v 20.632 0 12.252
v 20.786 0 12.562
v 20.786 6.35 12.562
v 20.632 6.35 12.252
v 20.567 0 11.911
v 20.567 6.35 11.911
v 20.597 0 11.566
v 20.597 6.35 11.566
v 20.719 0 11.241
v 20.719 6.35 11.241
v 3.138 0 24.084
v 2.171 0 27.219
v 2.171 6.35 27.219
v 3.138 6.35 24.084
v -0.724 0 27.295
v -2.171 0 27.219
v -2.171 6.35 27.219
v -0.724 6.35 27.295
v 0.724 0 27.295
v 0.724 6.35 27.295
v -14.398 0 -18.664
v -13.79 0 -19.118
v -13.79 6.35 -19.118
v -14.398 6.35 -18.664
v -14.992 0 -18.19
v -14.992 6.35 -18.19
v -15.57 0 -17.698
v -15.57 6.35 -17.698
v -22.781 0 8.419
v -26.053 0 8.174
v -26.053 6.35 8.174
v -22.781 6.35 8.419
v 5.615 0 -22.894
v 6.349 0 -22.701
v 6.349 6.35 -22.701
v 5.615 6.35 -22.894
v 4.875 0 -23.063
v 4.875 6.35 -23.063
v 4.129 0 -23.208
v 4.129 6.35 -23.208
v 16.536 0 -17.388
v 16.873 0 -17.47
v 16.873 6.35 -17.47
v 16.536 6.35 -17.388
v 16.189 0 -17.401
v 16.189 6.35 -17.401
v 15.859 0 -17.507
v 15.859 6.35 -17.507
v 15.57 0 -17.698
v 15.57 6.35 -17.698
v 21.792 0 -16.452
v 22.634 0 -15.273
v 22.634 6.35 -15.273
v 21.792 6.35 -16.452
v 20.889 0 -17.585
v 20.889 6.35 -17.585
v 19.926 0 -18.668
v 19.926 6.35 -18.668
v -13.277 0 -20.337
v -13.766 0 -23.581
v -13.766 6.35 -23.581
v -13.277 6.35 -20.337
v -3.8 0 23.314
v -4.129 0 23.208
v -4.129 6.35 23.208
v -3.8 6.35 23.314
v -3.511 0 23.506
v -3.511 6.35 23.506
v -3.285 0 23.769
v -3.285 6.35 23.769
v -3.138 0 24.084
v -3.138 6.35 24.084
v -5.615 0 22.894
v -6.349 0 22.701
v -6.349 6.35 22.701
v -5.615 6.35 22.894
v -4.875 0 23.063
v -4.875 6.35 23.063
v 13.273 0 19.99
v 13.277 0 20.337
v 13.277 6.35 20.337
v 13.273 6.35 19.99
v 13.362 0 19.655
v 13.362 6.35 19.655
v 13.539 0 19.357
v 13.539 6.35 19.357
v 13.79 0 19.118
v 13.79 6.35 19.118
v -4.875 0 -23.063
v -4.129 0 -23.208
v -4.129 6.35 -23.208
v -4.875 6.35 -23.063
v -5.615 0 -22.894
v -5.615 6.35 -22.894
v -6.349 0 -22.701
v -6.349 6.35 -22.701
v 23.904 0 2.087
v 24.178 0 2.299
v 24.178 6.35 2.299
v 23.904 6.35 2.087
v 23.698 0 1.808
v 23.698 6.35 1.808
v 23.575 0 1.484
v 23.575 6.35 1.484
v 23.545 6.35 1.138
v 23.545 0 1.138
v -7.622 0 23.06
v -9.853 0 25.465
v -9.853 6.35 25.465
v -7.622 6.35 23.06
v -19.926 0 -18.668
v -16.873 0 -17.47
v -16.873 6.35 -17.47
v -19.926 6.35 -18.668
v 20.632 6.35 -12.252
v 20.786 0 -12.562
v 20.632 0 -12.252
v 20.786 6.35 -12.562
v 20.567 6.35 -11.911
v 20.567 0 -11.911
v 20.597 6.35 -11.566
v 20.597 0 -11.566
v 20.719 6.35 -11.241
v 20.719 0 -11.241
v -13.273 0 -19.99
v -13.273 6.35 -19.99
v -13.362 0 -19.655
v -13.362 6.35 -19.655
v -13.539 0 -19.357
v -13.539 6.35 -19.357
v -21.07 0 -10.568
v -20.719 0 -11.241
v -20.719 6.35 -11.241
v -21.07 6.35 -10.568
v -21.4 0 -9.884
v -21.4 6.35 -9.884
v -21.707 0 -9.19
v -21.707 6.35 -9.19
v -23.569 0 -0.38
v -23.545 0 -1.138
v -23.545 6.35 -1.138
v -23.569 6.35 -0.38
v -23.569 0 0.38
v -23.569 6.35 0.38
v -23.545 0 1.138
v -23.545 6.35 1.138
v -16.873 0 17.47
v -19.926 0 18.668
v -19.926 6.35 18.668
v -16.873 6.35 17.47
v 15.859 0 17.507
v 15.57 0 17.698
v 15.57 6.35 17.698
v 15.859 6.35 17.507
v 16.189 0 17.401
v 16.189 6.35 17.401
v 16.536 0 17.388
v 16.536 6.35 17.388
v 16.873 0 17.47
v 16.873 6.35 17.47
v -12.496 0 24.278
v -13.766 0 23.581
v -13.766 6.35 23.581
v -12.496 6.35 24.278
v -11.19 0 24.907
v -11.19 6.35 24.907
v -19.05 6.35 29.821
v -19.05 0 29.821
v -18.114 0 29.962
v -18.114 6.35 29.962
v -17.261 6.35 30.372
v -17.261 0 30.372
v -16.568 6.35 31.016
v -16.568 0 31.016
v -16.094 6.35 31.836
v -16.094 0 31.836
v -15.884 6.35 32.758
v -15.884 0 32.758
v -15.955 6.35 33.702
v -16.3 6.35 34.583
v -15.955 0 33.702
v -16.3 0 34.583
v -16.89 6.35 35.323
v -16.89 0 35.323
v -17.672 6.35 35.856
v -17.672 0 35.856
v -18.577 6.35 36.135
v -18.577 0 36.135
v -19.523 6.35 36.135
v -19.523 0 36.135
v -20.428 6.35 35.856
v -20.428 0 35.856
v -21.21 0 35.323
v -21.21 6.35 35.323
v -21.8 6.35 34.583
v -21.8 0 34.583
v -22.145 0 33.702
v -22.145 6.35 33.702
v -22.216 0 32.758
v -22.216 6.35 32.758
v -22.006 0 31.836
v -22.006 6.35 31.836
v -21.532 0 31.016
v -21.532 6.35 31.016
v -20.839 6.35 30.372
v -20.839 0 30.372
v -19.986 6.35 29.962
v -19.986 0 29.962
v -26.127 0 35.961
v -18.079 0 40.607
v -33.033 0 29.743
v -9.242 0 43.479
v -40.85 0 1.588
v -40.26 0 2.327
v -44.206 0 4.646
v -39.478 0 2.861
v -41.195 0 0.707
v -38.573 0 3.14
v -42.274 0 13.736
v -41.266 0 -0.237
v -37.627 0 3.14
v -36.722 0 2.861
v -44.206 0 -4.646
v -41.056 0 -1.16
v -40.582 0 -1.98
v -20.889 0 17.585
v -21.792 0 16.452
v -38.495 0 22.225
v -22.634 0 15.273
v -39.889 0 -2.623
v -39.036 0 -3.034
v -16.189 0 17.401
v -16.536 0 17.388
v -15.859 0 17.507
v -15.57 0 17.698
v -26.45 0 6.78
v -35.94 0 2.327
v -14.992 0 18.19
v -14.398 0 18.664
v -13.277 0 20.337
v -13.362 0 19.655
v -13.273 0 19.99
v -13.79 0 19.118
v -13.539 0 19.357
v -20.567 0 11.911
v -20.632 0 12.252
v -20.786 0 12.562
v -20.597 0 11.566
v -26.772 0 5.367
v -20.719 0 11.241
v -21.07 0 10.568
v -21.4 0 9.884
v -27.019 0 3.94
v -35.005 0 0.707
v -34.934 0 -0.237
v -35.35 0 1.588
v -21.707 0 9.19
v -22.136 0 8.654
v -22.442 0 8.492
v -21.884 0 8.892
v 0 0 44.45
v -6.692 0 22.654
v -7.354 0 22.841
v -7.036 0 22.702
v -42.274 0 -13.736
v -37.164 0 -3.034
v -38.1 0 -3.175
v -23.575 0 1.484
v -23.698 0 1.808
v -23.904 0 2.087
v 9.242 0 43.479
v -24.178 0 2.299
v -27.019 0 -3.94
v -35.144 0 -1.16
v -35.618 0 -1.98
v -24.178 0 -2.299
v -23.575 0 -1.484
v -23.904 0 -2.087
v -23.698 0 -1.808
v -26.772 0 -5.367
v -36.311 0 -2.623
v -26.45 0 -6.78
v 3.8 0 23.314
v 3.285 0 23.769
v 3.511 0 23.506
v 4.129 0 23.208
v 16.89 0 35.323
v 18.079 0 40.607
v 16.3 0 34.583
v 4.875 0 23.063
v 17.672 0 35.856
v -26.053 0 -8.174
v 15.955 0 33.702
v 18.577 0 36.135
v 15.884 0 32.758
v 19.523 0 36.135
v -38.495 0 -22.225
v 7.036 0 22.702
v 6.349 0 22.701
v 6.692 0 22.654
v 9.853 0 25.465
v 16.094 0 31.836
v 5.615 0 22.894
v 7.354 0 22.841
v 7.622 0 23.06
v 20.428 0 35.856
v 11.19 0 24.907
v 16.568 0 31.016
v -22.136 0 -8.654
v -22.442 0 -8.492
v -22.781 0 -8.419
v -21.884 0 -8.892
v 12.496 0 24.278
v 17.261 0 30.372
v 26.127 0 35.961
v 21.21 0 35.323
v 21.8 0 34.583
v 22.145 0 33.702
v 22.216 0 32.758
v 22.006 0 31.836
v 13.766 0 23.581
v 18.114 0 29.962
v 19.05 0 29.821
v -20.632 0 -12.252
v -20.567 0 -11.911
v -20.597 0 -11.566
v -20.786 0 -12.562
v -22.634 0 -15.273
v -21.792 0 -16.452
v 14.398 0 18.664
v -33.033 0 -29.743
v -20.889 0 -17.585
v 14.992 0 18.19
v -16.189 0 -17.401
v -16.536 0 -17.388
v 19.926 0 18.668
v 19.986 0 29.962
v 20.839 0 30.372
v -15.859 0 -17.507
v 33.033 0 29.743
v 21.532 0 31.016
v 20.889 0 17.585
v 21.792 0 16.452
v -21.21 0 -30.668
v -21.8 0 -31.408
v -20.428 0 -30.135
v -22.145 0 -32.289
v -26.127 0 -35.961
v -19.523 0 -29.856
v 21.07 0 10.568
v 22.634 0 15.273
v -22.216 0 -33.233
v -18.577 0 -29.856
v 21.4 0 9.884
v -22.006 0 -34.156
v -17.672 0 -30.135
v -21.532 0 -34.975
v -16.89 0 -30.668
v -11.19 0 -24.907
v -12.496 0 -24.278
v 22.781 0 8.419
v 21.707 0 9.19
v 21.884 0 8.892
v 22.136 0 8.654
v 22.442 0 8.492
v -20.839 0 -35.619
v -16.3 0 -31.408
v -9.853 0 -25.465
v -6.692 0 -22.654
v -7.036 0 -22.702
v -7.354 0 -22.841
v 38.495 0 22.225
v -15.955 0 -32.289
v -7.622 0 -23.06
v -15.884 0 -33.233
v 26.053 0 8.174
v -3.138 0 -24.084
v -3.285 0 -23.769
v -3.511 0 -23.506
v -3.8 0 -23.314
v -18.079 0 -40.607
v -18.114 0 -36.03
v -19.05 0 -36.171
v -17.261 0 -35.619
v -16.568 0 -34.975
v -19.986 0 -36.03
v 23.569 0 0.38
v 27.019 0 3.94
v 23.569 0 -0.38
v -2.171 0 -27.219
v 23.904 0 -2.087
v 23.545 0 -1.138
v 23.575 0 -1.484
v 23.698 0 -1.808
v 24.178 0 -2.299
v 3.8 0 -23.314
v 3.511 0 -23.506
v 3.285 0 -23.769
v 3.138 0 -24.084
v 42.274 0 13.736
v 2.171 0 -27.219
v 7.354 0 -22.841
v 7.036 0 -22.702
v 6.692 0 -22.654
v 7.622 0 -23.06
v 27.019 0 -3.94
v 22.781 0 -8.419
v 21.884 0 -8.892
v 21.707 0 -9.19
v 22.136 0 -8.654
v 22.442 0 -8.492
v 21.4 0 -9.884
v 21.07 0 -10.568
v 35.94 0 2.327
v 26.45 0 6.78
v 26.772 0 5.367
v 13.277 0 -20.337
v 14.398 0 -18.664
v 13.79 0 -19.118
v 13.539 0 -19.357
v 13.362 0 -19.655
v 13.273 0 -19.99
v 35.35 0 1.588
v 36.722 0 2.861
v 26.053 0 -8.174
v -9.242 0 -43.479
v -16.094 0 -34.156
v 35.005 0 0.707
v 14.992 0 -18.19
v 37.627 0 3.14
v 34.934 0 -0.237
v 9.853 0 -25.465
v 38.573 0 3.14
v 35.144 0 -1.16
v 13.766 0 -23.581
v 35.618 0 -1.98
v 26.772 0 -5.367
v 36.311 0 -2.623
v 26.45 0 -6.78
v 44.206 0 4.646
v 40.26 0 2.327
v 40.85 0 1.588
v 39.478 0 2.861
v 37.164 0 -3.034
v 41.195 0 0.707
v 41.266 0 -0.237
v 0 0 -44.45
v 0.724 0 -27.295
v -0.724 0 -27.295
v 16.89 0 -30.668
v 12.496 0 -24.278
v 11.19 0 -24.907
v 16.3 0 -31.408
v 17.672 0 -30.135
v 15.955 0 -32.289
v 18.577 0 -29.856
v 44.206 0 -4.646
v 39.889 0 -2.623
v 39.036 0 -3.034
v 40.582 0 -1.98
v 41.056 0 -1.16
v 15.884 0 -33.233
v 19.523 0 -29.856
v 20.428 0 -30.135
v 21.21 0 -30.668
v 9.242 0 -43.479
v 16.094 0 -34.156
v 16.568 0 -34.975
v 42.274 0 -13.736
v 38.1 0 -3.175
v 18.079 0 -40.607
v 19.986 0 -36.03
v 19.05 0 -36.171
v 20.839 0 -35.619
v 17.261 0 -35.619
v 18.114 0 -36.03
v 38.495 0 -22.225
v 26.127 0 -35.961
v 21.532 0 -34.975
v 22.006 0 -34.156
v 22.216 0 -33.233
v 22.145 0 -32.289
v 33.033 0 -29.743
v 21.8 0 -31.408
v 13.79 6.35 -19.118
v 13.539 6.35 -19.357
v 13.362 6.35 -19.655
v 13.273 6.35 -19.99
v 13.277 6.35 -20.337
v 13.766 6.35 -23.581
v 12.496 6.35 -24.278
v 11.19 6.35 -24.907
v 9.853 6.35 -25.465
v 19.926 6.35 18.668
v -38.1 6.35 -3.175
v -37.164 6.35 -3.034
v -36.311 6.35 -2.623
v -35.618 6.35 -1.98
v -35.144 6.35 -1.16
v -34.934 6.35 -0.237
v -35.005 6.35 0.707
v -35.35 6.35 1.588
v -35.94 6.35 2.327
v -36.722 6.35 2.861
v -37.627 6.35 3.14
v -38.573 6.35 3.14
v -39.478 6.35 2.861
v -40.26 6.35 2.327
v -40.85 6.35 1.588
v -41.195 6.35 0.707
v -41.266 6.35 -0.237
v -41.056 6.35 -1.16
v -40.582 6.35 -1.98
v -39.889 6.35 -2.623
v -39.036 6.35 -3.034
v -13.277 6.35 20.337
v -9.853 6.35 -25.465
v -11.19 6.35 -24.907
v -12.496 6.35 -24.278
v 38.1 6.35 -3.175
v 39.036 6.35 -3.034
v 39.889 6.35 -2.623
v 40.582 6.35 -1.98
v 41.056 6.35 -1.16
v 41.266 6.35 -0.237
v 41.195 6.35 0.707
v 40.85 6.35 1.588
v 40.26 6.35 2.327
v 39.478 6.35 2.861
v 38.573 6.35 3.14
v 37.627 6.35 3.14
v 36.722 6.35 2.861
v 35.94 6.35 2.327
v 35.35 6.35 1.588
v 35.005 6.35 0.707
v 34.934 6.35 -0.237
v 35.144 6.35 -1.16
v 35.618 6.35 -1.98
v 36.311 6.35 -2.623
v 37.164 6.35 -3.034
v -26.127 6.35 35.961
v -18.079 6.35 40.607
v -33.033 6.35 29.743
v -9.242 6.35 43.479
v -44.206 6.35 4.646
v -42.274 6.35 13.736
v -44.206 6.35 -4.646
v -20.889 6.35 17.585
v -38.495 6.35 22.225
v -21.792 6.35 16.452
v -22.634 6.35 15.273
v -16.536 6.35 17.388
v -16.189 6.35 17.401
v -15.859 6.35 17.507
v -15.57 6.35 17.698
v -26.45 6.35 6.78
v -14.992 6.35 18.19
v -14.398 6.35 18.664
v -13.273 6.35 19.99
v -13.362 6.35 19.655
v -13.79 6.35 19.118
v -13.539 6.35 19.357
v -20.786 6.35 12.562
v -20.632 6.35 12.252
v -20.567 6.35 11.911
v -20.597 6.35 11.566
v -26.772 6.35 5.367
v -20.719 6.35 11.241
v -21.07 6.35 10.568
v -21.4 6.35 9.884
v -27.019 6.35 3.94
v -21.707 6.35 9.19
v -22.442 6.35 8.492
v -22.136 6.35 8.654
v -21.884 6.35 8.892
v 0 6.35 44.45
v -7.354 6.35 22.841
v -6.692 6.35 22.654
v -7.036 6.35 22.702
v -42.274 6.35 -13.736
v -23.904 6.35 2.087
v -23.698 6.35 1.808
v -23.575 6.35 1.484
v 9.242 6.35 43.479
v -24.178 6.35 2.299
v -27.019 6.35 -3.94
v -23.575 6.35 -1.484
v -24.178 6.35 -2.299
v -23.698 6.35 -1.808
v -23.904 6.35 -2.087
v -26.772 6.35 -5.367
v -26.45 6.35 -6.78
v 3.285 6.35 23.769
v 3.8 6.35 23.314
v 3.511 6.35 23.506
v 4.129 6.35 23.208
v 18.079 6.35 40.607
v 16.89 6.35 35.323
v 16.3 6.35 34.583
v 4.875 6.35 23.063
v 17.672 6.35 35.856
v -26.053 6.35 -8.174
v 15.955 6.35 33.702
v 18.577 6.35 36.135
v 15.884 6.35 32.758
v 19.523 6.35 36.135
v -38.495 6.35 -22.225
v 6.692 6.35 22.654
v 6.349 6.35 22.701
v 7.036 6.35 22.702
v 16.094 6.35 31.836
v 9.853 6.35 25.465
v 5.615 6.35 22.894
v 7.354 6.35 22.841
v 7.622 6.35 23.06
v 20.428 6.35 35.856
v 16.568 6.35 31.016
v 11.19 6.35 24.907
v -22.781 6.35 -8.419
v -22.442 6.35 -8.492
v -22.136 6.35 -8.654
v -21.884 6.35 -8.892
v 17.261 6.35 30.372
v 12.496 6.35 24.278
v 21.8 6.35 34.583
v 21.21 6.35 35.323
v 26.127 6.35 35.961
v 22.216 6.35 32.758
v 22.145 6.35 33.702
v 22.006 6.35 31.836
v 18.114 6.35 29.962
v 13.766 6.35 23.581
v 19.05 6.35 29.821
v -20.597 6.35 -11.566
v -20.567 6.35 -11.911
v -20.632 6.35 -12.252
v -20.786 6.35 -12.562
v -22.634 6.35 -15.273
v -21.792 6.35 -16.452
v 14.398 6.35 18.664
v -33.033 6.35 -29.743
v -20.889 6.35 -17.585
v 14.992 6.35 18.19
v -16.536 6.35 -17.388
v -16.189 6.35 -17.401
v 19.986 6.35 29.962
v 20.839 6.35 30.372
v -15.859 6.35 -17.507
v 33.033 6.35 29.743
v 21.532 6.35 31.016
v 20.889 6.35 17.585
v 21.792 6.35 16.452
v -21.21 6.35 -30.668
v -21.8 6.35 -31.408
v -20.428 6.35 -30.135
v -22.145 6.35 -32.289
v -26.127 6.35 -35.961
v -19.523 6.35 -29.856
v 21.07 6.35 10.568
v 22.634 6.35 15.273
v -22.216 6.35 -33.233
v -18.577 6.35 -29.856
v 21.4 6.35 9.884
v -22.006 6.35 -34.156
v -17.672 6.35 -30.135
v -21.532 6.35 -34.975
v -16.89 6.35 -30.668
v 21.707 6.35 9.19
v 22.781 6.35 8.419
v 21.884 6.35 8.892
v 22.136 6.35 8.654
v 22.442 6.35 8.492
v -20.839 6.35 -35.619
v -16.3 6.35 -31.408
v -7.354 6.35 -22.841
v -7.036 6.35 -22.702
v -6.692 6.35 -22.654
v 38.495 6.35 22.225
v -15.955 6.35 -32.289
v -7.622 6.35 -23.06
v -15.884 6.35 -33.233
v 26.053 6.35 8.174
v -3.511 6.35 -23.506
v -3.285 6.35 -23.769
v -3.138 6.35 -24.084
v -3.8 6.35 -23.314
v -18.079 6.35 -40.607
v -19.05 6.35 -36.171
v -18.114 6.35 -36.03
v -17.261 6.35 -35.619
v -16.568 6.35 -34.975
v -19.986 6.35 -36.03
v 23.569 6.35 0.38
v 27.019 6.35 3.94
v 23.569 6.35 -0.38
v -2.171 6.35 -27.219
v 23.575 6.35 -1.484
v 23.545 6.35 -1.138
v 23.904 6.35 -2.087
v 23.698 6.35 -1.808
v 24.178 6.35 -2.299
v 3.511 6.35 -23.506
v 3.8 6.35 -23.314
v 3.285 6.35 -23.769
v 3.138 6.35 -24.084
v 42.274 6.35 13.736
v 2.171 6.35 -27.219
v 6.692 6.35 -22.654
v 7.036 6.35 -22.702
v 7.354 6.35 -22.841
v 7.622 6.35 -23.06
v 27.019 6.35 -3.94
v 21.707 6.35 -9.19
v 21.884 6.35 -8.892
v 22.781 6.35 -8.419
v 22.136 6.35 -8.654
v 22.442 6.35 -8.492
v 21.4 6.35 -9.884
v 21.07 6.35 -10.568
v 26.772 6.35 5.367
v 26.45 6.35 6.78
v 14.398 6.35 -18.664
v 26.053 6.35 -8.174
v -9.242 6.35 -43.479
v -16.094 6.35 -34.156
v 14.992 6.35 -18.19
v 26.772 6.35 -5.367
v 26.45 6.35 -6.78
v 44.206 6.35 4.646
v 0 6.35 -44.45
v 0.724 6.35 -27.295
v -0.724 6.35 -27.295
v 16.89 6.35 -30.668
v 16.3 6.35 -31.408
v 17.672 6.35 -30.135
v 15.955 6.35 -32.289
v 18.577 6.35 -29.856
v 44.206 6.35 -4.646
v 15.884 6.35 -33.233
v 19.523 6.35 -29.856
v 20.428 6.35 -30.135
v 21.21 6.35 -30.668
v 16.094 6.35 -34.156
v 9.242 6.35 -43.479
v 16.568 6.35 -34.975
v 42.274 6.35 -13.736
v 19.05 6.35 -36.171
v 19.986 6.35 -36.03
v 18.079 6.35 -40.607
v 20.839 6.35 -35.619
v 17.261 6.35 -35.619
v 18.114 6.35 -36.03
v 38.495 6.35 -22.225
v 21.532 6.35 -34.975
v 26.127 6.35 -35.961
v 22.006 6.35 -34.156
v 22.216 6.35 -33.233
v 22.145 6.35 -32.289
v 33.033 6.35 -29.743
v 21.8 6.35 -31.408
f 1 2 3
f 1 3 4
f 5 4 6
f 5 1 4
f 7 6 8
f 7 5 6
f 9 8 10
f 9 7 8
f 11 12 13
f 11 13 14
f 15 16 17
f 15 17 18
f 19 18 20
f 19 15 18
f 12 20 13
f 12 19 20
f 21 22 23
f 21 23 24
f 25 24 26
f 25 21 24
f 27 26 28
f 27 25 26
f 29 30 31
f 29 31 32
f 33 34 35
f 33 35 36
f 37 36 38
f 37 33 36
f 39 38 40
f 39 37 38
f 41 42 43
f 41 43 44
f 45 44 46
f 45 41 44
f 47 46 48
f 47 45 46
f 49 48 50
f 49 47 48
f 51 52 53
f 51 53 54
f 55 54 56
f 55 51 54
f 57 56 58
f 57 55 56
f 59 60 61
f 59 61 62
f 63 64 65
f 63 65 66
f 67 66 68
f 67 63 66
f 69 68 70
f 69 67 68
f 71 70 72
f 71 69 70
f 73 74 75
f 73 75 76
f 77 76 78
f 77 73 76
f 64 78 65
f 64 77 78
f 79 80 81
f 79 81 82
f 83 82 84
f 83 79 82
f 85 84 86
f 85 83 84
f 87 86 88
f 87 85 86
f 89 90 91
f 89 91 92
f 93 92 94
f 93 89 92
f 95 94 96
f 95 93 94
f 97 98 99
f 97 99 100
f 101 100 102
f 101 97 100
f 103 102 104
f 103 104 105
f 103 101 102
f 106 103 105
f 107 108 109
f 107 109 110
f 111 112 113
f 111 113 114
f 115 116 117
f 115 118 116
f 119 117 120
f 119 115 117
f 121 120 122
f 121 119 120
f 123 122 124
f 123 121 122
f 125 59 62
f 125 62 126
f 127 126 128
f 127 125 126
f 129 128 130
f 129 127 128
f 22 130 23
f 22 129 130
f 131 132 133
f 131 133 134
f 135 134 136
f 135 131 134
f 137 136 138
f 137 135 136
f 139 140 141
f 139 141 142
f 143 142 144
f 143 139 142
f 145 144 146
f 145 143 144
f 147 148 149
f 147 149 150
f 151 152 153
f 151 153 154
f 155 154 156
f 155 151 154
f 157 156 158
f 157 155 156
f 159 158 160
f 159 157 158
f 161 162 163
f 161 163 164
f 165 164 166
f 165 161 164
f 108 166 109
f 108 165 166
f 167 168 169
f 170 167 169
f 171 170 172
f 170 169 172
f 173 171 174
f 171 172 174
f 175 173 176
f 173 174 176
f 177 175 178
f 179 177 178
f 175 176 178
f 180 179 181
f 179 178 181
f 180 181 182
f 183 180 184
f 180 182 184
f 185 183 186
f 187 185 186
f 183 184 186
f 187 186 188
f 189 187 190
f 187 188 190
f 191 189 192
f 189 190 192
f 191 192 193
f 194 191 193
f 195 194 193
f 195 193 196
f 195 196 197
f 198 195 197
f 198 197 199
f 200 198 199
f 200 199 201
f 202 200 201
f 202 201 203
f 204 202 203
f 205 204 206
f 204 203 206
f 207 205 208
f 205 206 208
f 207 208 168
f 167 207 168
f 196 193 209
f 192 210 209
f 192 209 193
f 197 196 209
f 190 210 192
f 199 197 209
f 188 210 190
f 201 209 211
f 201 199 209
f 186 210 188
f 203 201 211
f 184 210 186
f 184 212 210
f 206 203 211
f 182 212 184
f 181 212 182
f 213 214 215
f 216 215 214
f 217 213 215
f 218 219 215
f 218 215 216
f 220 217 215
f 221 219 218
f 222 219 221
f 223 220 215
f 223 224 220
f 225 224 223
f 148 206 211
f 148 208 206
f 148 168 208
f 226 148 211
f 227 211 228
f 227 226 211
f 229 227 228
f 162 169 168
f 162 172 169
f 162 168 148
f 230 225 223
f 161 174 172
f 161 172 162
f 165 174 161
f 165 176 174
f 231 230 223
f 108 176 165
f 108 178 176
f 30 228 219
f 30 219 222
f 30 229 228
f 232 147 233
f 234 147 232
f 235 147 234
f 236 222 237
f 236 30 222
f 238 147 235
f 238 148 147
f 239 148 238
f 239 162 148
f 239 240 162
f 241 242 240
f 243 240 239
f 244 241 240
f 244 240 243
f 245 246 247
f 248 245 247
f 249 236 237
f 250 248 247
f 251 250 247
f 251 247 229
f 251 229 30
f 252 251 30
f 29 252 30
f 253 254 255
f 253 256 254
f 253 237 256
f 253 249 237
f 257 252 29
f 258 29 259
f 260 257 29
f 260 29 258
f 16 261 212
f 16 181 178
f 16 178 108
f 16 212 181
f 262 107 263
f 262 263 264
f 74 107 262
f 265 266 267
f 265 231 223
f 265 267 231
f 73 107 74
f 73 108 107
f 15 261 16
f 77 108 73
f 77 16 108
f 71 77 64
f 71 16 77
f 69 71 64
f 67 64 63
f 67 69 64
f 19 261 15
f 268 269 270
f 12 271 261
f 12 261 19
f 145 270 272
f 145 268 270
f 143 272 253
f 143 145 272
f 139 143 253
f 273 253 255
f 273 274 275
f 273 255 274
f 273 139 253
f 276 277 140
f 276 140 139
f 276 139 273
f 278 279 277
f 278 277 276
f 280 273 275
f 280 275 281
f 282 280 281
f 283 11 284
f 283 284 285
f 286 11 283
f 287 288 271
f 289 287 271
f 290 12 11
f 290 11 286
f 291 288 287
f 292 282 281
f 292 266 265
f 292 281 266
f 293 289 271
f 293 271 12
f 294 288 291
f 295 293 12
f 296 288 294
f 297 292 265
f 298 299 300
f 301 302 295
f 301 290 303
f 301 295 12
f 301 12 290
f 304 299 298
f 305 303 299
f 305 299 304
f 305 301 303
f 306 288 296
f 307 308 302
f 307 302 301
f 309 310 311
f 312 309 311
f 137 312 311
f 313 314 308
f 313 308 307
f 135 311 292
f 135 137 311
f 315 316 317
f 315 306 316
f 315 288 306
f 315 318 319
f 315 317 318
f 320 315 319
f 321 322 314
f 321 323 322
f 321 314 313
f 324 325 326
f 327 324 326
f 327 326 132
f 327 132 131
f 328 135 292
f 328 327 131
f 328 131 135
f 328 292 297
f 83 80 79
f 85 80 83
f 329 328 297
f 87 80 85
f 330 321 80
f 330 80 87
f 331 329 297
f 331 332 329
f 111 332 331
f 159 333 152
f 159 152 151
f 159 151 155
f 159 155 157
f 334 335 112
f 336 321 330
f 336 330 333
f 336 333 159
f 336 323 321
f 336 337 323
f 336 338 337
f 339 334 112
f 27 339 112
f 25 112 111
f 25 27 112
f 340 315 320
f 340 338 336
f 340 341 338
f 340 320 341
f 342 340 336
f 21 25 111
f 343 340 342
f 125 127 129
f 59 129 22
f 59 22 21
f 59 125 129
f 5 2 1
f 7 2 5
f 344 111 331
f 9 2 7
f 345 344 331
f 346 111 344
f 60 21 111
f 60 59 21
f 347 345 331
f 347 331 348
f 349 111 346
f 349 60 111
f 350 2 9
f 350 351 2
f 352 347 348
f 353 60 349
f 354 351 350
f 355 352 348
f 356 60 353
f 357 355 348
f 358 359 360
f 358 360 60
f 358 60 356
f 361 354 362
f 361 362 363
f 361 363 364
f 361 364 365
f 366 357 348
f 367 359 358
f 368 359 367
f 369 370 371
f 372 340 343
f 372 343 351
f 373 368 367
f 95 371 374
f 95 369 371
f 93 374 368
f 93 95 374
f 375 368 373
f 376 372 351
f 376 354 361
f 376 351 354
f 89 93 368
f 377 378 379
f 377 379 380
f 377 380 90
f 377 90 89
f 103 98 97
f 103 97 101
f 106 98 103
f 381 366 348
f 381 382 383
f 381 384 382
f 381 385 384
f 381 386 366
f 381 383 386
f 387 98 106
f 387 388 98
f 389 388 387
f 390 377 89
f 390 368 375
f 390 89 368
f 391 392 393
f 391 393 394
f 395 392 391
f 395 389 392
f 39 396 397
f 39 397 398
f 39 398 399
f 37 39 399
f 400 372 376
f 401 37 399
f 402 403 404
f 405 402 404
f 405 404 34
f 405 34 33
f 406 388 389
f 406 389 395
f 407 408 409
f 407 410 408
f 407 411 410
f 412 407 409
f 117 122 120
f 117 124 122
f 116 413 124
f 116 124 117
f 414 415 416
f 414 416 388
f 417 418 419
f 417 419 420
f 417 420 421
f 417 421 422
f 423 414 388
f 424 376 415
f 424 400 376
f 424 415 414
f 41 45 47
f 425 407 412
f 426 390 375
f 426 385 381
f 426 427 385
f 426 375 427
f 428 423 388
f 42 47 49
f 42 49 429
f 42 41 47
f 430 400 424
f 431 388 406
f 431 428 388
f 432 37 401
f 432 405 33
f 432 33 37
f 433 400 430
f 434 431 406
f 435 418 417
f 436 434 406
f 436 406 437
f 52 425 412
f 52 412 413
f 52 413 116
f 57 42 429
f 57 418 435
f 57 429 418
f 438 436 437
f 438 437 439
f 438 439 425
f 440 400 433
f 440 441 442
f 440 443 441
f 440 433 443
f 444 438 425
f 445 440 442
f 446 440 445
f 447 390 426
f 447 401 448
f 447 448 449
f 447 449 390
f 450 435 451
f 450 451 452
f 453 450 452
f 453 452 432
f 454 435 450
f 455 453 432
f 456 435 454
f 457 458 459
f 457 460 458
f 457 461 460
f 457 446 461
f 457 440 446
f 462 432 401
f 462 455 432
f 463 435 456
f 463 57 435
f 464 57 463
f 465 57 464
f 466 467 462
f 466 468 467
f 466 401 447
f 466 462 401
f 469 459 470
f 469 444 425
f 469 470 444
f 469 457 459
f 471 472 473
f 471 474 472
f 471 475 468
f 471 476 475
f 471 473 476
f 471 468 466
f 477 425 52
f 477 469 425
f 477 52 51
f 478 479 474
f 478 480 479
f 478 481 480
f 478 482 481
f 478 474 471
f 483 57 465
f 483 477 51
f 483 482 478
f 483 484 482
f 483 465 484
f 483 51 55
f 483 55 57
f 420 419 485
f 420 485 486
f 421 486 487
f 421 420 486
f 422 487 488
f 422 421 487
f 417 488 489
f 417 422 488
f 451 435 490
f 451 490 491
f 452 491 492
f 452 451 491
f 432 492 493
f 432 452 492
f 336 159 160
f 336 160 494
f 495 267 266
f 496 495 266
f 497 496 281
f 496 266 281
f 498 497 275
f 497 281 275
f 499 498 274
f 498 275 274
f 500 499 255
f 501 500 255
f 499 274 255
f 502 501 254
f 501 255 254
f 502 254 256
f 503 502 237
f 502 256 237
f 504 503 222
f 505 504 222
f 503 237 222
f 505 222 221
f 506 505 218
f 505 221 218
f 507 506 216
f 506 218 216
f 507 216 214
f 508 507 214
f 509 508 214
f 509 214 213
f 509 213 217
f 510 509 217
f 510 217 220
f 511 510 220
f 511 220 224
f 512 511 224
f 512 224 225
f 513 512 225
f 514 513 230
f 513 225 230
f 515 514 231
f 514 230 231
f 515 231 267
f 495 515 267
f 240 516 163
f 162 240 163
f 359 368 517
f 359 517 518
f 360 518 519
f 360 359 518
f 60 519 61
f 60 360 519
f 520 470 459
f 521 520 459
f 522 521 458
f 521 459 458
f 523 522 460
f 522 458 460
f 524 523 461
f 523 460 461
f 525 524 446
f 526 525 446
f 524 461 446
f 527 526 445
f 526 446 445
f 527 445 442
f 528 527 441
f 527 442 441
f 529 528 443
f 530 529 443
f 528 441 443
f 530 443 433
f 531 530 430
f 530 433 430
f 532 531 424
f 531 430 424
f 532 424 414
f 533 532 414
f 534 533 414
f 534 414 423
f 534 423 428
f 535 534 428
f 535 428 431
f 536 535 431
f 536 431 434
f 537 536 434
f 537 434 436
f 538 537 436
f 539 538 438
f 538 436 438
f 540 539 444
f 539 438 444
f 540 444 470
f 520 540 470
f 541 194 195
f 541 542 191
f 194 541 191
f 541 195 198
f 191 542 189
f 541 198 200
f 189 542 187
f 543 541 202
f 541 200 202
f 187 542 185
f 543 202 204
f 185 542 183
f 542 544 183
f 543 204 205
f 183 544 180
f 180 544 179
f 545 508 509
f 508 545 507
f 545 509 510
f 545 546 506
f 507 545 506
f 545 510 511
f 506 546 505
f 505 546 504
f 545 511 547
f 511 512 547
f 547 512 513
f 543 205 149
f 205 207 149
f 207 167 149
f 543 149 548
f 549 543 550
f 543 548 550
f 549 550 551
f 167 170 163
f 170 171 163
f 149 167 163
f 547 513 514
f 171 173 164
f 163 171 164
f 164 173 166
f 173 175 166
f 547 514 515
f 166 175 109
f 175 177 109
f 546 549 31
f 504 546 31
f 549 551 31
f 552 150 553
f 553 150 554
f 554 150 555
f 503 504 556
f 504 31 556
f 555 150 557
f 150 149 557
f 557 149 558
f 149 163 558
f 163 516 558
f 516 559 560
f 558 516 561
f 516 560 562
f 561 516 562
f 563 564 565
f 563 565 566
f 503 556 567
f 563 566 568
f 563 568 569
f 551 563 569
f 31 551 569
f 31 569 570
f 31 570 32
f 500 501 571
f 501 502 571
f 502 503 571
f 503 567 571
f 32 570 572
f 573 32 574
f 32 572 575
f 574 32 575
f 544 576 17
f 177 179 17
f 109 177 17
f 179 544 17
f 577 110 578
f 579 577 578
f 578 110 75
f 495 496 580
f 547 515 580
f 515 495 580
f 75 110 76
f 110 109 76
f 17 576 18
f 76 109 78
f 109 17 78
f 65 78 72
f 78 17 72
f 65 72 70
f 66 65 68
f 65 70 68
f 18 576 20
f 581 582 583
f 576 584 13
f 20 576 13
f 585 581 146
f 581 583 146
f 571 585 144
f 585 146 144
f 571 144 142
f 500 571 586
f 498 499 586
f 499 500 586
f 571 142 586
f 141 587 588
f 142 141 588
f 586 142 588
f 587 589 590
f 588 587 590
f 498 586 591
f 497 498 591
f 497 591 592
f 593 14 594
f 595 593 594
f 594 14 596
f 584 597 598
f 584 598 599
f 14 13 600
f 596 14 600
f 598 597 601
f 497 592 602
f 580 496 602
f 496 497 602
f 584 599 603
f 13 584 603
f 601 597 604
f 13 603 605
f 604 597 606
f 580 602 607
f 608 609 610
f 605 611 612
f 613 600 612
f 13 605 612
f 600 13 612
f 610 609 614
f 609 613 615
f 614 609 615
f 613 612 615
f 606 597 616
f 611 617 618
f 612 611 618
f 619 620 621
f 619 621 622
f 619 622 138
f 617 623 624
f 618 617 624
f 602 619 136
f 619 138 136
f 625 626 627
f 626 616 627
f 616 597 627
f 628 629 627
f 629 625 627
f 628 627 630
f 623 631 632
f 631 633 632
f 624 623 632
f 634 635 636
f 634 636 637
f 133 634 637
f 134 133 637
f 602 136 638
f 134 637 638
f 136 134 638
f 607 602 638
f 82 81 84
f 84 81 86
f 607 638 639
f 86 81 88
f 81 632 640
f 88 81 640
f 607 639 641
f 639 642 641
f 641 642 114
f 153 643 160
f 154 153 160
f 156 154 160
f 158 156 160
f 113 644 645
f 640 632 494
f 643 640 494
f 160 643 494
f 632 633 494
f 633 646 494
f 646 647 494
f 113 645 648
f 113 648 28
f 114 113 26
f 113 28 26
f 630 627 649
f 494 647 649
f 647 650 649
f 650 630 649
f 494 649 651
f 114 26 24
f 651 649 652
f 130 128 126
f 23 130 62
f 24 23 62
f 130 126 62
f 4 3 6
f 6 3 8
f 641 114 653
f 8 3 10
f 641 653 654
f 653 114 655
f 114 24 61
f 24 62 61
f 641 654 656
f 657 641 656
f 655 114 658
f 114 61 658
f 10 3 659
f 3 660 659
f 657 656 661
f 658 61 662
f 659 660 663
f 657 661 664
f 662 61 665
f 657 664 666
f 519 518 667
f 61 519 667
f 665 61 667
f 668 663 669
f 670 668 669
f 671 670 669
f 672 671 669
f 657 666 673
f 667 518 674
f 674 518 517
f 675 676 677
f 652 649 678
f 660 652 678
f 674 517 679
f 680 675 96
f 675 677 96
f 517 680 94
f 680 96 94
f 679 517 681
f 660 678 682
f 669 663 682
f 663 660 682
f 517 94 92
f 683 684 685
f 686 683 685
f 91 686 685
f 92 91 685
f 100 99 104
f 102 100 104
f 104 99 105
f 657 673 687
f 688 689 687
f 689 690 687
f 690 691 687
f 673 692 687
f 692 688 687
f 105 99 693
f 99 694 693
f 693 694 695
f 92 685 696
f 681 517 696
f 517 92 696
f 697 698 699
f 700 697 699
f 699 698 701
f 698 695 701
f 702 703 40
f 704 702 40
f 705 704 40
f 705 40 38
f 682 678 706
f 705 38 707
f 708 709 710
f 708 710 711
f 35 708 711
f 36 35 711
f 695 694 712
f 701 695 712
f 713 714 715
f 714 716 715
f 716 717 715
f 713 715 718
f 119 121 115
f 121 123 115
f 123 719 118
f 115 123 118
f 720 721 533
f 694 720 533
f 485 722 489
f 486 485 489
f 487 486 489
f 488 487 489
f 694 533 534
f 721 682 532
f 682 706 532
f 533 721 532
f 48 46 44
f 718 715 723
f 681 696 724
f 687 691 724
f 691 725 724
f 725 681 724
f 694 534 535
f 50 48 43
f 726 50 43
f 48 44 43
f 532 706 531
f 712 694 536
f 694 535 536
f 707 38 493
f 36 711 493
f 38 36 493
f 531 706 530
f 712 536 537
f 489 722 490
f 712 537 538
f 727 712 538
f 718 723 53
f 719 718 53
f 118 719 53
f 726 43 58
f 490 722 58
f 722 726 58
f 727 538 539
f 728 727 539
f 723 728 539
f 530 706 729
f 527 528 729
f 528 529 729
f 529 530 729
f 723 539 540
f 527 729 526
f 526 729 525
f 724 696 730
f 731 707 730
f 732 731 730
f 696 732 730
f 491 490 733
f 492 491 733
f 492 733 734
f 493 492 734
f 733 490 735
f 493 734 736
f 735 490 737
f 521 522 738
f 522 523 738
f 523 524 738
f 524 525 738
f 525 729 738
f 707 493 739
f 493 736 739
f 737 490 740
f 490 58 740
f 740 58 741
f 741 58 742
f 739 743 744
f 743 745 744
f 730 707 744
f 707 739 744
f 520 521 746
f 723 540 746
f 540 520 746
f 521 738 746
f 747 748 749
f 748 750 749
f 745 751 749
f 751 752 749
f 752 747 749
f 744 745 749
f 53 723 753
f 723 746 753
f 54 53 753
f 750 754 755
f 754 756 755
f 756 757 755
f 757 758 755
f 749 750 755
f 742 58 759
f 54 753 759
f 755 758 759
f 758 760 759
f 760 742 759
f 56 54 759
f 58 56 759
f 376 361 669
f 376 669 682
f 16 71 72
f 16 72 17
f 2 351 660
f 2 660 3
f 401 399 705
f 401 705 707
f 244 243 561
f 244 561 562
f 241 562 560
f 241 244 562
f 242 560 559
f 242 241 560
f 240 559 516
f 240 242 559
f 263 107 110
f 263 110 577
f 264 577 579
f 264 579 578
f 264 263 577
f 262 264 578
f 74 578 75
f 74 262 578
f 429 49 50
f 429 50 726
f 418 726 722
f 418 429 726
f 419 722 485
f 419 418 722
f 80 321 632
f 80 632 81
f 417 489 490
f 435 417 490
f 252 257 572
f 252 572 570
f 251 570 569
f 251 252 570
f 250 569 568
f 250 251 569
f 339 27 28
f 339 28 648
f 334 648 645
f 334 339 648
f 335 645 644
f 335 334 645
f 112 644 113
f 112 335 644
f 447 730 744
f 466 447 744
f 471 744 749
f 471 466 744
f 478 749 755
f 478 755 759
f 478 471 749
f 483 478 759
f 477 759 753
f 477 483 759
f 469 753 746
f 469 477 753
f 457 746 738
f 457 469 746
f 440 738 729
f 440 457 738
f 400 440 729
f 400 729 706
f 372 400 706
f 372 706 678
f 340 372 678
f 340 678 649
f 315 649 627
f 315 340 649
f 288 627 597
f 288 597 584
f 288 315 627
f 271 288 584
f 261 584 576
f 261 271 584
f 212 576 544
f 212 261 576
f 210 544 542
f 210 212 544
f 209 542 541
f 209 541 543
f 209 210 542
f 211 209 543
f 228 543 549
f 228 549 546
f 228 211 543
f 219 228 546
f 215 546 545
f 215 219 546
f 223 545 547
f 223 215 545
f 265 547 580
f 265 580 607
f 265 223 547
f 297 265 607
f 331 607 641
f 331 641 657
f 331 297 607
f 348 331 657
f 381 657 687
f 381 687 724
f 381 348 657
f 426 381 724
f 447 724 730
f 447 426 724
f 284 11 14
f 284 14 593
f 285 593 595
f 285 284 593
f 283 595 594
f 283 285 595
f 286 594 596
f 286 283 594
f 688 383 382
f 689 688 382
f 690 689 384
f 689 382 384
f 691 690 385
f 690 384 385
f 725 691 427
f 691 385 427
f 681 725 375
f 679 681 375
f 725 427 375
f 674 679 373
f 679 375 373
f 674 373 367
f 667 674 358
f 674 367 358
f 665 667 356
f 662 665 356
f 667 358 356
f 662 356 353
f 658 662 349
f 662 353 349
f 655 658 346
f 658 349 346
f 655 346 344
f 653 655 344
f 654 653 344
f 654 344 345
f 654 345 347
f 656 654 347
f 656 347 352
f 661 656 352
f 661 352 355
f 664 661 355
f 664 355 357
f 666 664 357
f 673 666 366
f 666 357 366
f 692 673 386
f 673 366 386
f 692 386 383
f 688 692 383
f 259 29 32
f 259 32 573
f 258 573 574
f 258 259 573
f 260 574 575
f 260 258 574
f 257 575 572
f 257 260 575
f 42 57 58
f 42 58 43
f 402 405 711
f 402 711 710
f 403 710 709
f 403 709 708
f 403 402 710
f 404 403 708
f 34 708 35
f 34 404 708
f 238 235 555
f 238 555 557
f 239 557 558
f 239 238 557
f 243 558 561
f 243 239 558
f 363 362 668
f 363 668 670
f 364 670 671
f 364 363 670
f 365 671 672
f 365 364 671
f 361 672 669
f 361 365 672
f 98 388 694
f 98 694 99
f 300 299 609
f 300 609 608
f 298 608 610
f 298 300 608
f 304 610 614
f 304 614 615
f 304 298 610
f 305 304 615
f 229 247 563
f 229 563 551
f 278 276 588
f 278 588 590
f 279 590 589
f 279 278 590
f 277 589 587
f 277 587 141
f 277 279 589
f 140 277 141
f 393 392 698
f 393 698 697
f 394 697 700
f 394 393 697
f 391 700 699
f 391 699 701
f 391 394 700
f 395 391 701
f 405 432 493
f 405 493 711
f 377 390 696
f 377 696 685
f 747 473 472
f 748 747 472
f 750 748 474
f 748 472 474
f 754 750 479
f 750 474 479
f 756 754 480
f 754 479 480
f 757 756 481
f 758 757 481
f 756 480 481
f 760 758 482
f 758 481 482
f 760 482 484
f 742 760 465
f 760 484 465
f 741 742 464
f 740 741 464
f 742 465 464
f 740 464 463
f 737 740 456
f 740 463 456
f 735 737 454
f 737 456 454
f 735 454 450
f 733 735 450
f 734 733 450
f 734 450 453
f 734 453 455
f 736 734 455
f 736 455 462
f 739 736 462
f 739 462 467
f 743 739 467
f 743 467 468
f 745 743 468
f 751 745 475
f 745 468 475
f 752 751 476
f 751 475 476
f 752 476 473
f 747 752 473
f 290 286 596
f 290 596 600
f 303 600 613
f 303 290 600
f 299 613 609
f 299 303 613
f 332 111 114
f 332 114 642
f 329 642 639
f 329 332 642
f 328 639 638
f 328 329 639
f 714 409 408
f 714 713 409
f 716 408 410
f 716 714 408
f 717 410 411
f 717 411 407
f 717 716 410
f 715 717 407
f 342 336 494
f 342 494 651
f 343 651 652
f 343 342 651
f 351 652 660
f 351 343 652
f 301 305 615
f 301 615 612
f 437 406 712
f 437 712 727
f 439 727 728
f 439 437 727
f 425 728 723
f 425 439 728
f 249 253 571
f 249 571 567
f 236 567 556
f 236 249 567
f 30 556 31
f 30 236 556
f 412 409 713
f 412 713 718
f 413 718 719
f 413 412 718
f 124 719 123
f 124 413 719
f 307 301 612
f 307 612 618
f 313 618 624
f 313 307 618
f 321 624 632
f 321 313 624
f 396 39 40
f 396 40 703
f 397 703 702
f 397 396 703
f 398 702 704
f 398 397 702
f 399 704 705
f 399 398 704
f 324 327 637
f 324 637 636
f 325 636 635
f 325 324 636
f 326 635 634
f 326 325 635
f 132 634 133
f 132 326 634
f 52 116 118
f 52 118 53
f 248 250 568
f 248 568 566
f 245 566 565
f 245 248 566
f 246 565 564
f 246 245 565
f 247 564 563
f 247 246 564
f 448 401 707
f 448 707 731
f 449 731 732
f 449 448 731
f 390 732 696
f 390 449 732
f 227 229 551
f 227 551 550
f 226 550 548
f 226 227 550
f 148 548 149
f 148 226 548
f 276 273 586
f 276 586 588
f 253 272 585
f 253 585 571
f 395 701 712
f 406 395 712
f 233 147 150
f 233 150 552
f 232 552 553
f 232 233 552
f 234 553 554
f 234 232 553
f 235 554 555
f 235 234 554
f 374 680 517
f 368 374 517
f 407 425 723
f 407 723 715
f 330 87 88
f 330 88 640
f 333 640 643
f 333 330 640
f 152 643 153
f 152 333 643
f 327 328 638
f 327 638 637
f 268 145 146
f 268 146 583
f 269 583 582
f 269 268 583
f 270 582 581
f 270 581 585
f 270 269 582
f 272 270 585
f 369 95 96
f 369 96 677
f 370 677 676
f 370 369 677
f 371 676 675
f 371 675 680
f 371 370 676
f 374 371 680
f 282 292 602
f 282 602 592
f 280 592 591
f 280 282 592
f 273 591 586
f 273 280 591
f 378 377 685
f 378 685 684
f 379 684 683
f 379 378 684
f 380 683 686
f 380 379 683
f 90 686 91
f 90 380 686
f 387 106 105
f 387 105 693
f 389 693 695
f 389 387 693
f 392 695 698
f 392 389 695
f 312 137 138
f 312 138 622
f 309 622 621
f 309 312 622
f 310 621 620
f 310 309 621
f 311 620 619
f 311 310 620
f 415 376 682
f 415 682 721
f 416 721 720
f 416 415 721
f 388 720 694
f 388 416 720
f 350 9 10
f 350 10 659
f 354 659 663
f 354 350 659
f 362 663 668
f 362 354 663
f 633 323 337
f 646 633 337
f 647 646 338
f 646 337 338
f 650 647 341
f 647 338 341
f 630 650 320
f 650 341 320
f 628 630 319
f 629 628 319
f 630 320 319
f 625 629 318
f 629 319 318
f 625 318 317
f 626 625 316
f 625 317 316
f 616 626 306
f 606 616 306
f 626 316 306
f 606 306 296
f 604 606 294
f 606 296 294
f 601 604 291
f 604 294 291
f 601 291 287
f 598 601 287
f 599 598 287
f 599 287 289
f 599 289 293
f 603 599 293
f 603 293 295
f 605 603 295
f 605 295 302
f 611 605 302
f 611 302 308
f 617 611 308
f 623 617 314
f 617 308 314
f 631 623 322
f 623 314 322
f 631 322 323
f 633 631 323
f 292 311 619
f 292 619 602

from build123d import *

# Parameters (mm, degrees)
TOOTH_DEPTH         = 6.35
CIRPATTERN2_COUNT   = 14
FILLET2_R           = 1.27
CIRPATTERN10_DEPTH  = 6.35
SKETCH2_R           = 44.45
SKETCH2_R_2         = 3.175
SKETCH2_R_3         = 33.655
BOSS_EXTRUDE2_DEPTH = 6.35


# Read off the part's stored shape, not the designer's step: CirPattern10
with BuildPart() as part:
    # Sketch1 → tooth (new body)
    with BuildSketch(Plane(origin=(0, 0, 0), x_dir=(1, 0, 0), z_dir=(0, 1, 0))):
        with BuildLine():
            Line((23.495, 1.905), (27.019279154, 3.939743518))
            ThreePointArc((27.019279154, 3.939743518), (26.594581963, 6.18799121), (25.983150393, 8.392789801))
            Line((25.983150393, 8.392789801), (32.025743508, 10.344601382))
            ThreePointArc((32.025743508, 10.344601382), (33.536845379, 2.817627907), (33.302832446, -4.855962941))
            Line((33.302832446, -4.855962941), (27.019279154, -3.939743518))
            Line((27.019279154, -3.939743518), (23.495, -1.905))
            ThreePointArc((23.495, -1.905), (23.572103215, 0), (23.495, 1.905))
        make_face()
    tooth = extrude(amount=TOOTH_DEPTH)

    # CirPattern2: tooth ×14 about axis
    cirpattern2_axis = Axis((0, 0, 0), (0, 1, 0))
    for i in range(1, CIRPATTERN2_COUNT):
        add(tooth.rotate(cirpattern2_axis, i * 360 / CIRPATTERN2_COUNT))

    # Fillet2
    fillet2_edges = [part.edges().sort_by_distance(p)[0] for p in [
        (20.341715028, 3.175, -11.910444144),
        (21.994812074, 3.175, -8.477752757),
    ]]
    fillet(fillet2_edges, radius=FILLET2_R)

    # CirPattern10 outline → CirPattern10 (cut)
    with BuildSketch(Plane(origin=(0, 0, 0), x_dir=(1, 0, 0), z_dir=(0, 1, 0))):
        with BuildLine():
            ThreePointArc((21.994812074, -8.477752757), (21.853716341, -8.835107925), (21.706815016, -9.190115986))
            ThreePointArc((21.706815016, -9.190115986), (22.135768899, -8.653514623), (22.781411207, -8.418805301))
            Line((22.781411207, -8.418805301), (21.994812074, -8.477752757))
        make_face()
        with BuildLine():
            ThreePointArc((20.786064589, -12.562185248), (20.567016331, -11.911062896), (20.719099799, -11.241127769))
            ThreePointArc((20.719099799, -11.241127769), (20.533134799, -11.577323755), (20.341715028, -11.910444144))
            Line((20.341715028, -11.910444144), (20.786064589, -12.562185248))
        make_face()
        with BuildLine():
            ThreePointArc((16.138281869, -17.181382608), (15.85610841, -17.442129345), (15.569722665, -17.698242459))
            ThreePointArc((15.569722665, -17.698242459), (16.189019364, -17.400897451), (16.872559541, -17.469565358))
            Line((16.872559541, -17.469565358), (16.138281869, -17.181382608))
        make_face()
        with BuildLine():
            ThreePointArc((13.277069174, -20.336873246), (13.362224913, -19.655190801), (13.789921341, -19.117586652))
            ThreePointArc((13.789921341, -19.117586652), (13.476502695, -19.339801579), (13.159503921, -19.556878753))
            Line((13.159503921, -19.556878753), (13.277069174, -20.336873246))
        make_face()
        with BuildLine():
            ThreePointArc((7.085367016, -22.482028918), (6.718003745, -22.594523135), (6.348855789, -22.70101496))
            ThreePointArc((6.348855789, -22.70101496), (7.035835999, -22.701819131), (7.62189053, -23.060263746))
            Line((7.62189053, -23.060263746), (7.085367016, -22.482028918))
        make_face()
        with BuildLine():
            ThreePointArc((3.138387377, -24.083594083), (3.510880975, -23.506367113), (4.12947984, -23.207573037))
            ThreePointArc((4.12947984, -23.207573037), (3.750683953, -23.271794514), (3.370891671, -23.329833676))
            Line((3.370891671, -23.329833676), (3.138387377, -24.083594083))
        make_face()
        with BuildLine():
            ThreePointArc((-3.370891671, -23.329833676), (-3.750683953, -23.271794514), (-4.12947984, -23.207573037))
            ThreePointArc((-4.12947984, -23.207573037), (-3.510880975, -23.506367113), (-3.138387377, -24.083594083))
            Line((-3.138387377, -24.083594083), (-3.370891671, -23.329833676))
        make_face()
        with BuildLine():
            ThreePointArc((-7.62189053, -23.060263746), (-7.035835999, -22.701819131), (-6.348855789, -22.701014959))
            ThreePointArc((-6.348855789, -22.701014959), (-6.718003745, -22.594523135), (-7.085367016, -22.482028918))
            Line((-7.085367016, -22.482028918), (-7.62189053, -23.060263746))
        make_face()
        with BuildLine():
            ThreePointArc((-13.159503921, -19.556878753), (-13.476502695, -19.339801579), (-13.789921341, -19.117586652))
            ThreePointArc((-13.789921341, -19.117586652), (-13.362224913, -19.655190801), (-13.277069174, -20.336873246))
            Line((-13.277069174, -20.336873246), (-13.159503921, -19.556878753))
        make_face()
        with BuildLine():
            ThreePointArc((-16.872559541, -17.469565358), (-16.189019364, -17.400897451), (-15.569722665, -17.698242459))
            ThreePointArc((-15.569722665, -17.698242459), (-15.85610841, -17.442129345), (-16.138281869, -17.181382608))
            Line((-16.138281869, -17.181382608), (-16.872559541, -17.469565358))
        make_face()
        with BuildLine():
            ThreePointArc((-20.341715028, -11.910444144), (-20.533134799, -11.577323755), (-20.719099799, -11.241127769))
            ThreePointArc((-20.719099799, -11.241127769), (-20.567016331, -11.911062896), (-20.786064589, -12.562185248))
            Line((-20.786064589, -12.562185248), (-20.341715028, -11.910444144))
        make_face()
        with BuildLine():
            ThreePointArc((-22.781411207, -8.418805301), (-22.135768899, -8.653514623), (-21.706815017, -9.190115986))
            ThreePointArc((-21.706815017, -9.190115986), (-21.853716341, -8.835107925), (-21.994812074, -8.477752757))
            Line((-21.994812074, -8.477752757), (-22.781411207, -8.418805301))
        make_face()
        with BuildLine():
            ThreePointArc((-23.495, -1.905), (-23.522927734, -1.521814974), (-23.544606438, -1.138225668))
            ThreePointArc((-23.544606438, -1.138225668), (-23.698257926, -1.807802905), (-24.178124988, -2.299402395))
            Line((-24.178124988, -2.299402395), (-23.495, -1.905))
        make_face()
        with BuildLine():
            ThreePointArc((-24.178124988, 2.299402395), (-23.698257926, 1.807802905), (-23.544606438, 1.138225668))
            ThreePointArc((-23.544606438, 1.138225668), (-23.522927734, 1.521814974), (-23.495, 1.905))
            Line((-23.495, 1.905), (-24.178124988, 2.299402395))
        make_face()
        with BuildLine():
            ThreePointArc((-21.994812074, 8.477752757), (-21.853716341, 8.835107925), (-21.706815016, 9.190115986))
            ThreePointArc((-21.706815016, 9.190115986), (-22.135768899, 8.653514623), (-22.781411207, 8.418805301))
            Line((-22.781411207, 8.418805301), (-21.994812074, 8.477752757))
        make_face()
        with BuildLine():
            ThreePointArc((-20.786064589, 12.562185248), (-20.567016331, 11.911062896), (-20.719099799, 11.241127769))
            ThreePointArc((-20.719099799, 11.241127769), (-20.533134799, 11.577323755), (-20.341715028, 11.910444144))
            Line((-20.341715028, 11.910444144), (-20.786064589, 12.562185248))
        make_face()
        with BuildLine():
            ThreePointArc((-16.138281869, 17.181382608), (-15.85610841, 17.442129345), (-15.569722665, 17.698242459))
            ThreePointArc((-15.569722665, 17.698242459), (-16.189019364, 17.400897451), (-16.872559541, 17.469565358))
            Line((-16.872559541, 17.469565358), (-16.138281869, 17.181382608))
        make_face()
        with BuildLine():
            ThreePointArc((-13.277069174, 20.336873246), (-13.362224913, 19.655190801), (-13.789921341, 19.117586652))
            ThreePointArc((-13.789921341, 19.117586652), (-13.476502695, 19.339801579), (-13.159503921, 19.556878753))
            Line((-13.159503921, 19.556878753), (-13.277069174, 20.336873246))
        make_face()
        with BuildLine():
            ThreePointArc((-7.085367016, 22.482028918), (-6.718003745, 22.594523135), (-6.348855789, 22.70101496))
            ThreePointArc((-6.348855789, 22.70101496), (-7.035835999, 22.701819131), (-7.62189053, 23.060263746))
            Line((-7.62189053, 23.060263746), (-7.085367016, 22.482028918))
        make_face()
        with BuildLine():
            ThreePointArc((-3.138387377, 24.083594083), (-3.510880975, 23.506367113), (-4.12947984, 23.207573037))
            ThreePointArc((-4.12947984, 23.207573037), (-3.750683953, 23.271794514), (-3.370891671, 23.329833676))
            Line((-3.370891671, 23.329833676), (-3.138387377, 24.083594083))
        make_face()
        with BuildLine():
            ThreePointArc((3.370891671, 23.329833676), (3.750683953, 23.271794514), (4.12947984, 23.207573037))
            ThreePointArc((4.12947984, 23.207573037), (3.510880975, 23.506367113), (3.138387377, 24.083594083))
            Line((3.138387377, 24.083594083), (3.370891671, 23.329833676))
        make_face()
        with BuildLine():
            ThreePointArc((7.62189053, 23.060263746), (7.035835999, 22.701819131), (6.348855789, 22.701014959))
            ThreePointArc((6.348855789, 22.701014959), (6.718003745, 22.594523135), (7.085367016, 22.482028918))
            Line((7.085367016, 22.482028918), (7.62189053, 23.060263746))
        make_face()
        with BuildLine():
            ThreePointArc((13.159503921, 19.556878753), (13.476502695, 19.339801579), (13.789921341, 19.117586652))
            ThreePointArc((13.789921341, 19.117586652), (13.362224913, 19.655190801), (13.277069174, 20.336873246))
            Line((13.277069174, 20.336873246), (13.159503921, 19.556878753))
        make_face()
        with BuildLine():
            ThreePointArc((16.872559541, 17.469565358), (16.189019364, 17.400897451), (15.569722665, 17.698242459))
            ThreePointArc((15.569722665, 17.698242459), (15.85610841, 17.442129345), (16.138281869, 17.181382608))
            Line((16.138281869, 17.181382608), (16.872559541, 17.469565358))
        make_face()
        with BuildLine():
            ThreePointArc((23.495, 1.905), (23.522927734, 1.521814974), (23.544606438, 1.138225668))
            ThreePointArc((23.544606438, 1.138225668), (23.698257926, 1.807802905), (24.178124988, 2.299402395))
            Line((24.178124988, 2.299402395), (23.495, 1.905))
        make_face()
        with BuildLine():
            ThreePointArc((24.178124988, -2.299402395), (23.698257926, -1.807802905), (23.544606438, -1.138225668))
            ThreePointArc((23.544606438, -1.138225668), (23.522927734, -1.521814974), (23.495, -1.905))
            Line((23.495, -1.905), (24.178124988, -2.299402395))
        make_face()
    extrude(amount=CIRPATTERN10_DEPTH, mode=Mode.SUBTRACT)

    # Sketch2 → Boss-Extrude2 (add)
    with BuildSketch(Plane.XZ):
        with Locations(Location((0, 0, 0), (0, 0, 270))):
            Circle(SKETCH2_R)
        with Locations(Location((38.1, 0, 0), (0, 0, 270))):
            Circle(SKETCH2_R_2, mode=Mode.SUBTRACT)
        Circle(SKETCH2_R_3, mode=Mode.SUBTRACT)
        with Locations(Location((19.05, -32.995567884, 0), (0, 0, 270))):
            Circle(SKETCH2_R_2, mode=Mode.SUBTRACT)
        with Locations(Location((-19.05, -32.995567884, 0), (0, 0, 270))):
            Circle(SKETCH2_R_2, mode=Mode.SUBTRACT)
        with Locations(Location((-38.1, 0, 0), (0, 0, 270))):
            Circle(SKETCH2_R_2, mode=Mode.SUBTRACT)
        with Locations(Location((-19.05, 32.995567884, 0), (0, 0, 270))):
            Circle(SKETCH2_R_2, mode=Mode.SUBTRACT)
        with Locations(Location((19.05, 32.995567884, 0), (0, 0, 270))):
            Circle(SKETCH2_R_2, mode=Mode.SUBTRACT)
    extrude(amount=-BOSS_EXTRUDE2_DEPTH)


solid = part.part
